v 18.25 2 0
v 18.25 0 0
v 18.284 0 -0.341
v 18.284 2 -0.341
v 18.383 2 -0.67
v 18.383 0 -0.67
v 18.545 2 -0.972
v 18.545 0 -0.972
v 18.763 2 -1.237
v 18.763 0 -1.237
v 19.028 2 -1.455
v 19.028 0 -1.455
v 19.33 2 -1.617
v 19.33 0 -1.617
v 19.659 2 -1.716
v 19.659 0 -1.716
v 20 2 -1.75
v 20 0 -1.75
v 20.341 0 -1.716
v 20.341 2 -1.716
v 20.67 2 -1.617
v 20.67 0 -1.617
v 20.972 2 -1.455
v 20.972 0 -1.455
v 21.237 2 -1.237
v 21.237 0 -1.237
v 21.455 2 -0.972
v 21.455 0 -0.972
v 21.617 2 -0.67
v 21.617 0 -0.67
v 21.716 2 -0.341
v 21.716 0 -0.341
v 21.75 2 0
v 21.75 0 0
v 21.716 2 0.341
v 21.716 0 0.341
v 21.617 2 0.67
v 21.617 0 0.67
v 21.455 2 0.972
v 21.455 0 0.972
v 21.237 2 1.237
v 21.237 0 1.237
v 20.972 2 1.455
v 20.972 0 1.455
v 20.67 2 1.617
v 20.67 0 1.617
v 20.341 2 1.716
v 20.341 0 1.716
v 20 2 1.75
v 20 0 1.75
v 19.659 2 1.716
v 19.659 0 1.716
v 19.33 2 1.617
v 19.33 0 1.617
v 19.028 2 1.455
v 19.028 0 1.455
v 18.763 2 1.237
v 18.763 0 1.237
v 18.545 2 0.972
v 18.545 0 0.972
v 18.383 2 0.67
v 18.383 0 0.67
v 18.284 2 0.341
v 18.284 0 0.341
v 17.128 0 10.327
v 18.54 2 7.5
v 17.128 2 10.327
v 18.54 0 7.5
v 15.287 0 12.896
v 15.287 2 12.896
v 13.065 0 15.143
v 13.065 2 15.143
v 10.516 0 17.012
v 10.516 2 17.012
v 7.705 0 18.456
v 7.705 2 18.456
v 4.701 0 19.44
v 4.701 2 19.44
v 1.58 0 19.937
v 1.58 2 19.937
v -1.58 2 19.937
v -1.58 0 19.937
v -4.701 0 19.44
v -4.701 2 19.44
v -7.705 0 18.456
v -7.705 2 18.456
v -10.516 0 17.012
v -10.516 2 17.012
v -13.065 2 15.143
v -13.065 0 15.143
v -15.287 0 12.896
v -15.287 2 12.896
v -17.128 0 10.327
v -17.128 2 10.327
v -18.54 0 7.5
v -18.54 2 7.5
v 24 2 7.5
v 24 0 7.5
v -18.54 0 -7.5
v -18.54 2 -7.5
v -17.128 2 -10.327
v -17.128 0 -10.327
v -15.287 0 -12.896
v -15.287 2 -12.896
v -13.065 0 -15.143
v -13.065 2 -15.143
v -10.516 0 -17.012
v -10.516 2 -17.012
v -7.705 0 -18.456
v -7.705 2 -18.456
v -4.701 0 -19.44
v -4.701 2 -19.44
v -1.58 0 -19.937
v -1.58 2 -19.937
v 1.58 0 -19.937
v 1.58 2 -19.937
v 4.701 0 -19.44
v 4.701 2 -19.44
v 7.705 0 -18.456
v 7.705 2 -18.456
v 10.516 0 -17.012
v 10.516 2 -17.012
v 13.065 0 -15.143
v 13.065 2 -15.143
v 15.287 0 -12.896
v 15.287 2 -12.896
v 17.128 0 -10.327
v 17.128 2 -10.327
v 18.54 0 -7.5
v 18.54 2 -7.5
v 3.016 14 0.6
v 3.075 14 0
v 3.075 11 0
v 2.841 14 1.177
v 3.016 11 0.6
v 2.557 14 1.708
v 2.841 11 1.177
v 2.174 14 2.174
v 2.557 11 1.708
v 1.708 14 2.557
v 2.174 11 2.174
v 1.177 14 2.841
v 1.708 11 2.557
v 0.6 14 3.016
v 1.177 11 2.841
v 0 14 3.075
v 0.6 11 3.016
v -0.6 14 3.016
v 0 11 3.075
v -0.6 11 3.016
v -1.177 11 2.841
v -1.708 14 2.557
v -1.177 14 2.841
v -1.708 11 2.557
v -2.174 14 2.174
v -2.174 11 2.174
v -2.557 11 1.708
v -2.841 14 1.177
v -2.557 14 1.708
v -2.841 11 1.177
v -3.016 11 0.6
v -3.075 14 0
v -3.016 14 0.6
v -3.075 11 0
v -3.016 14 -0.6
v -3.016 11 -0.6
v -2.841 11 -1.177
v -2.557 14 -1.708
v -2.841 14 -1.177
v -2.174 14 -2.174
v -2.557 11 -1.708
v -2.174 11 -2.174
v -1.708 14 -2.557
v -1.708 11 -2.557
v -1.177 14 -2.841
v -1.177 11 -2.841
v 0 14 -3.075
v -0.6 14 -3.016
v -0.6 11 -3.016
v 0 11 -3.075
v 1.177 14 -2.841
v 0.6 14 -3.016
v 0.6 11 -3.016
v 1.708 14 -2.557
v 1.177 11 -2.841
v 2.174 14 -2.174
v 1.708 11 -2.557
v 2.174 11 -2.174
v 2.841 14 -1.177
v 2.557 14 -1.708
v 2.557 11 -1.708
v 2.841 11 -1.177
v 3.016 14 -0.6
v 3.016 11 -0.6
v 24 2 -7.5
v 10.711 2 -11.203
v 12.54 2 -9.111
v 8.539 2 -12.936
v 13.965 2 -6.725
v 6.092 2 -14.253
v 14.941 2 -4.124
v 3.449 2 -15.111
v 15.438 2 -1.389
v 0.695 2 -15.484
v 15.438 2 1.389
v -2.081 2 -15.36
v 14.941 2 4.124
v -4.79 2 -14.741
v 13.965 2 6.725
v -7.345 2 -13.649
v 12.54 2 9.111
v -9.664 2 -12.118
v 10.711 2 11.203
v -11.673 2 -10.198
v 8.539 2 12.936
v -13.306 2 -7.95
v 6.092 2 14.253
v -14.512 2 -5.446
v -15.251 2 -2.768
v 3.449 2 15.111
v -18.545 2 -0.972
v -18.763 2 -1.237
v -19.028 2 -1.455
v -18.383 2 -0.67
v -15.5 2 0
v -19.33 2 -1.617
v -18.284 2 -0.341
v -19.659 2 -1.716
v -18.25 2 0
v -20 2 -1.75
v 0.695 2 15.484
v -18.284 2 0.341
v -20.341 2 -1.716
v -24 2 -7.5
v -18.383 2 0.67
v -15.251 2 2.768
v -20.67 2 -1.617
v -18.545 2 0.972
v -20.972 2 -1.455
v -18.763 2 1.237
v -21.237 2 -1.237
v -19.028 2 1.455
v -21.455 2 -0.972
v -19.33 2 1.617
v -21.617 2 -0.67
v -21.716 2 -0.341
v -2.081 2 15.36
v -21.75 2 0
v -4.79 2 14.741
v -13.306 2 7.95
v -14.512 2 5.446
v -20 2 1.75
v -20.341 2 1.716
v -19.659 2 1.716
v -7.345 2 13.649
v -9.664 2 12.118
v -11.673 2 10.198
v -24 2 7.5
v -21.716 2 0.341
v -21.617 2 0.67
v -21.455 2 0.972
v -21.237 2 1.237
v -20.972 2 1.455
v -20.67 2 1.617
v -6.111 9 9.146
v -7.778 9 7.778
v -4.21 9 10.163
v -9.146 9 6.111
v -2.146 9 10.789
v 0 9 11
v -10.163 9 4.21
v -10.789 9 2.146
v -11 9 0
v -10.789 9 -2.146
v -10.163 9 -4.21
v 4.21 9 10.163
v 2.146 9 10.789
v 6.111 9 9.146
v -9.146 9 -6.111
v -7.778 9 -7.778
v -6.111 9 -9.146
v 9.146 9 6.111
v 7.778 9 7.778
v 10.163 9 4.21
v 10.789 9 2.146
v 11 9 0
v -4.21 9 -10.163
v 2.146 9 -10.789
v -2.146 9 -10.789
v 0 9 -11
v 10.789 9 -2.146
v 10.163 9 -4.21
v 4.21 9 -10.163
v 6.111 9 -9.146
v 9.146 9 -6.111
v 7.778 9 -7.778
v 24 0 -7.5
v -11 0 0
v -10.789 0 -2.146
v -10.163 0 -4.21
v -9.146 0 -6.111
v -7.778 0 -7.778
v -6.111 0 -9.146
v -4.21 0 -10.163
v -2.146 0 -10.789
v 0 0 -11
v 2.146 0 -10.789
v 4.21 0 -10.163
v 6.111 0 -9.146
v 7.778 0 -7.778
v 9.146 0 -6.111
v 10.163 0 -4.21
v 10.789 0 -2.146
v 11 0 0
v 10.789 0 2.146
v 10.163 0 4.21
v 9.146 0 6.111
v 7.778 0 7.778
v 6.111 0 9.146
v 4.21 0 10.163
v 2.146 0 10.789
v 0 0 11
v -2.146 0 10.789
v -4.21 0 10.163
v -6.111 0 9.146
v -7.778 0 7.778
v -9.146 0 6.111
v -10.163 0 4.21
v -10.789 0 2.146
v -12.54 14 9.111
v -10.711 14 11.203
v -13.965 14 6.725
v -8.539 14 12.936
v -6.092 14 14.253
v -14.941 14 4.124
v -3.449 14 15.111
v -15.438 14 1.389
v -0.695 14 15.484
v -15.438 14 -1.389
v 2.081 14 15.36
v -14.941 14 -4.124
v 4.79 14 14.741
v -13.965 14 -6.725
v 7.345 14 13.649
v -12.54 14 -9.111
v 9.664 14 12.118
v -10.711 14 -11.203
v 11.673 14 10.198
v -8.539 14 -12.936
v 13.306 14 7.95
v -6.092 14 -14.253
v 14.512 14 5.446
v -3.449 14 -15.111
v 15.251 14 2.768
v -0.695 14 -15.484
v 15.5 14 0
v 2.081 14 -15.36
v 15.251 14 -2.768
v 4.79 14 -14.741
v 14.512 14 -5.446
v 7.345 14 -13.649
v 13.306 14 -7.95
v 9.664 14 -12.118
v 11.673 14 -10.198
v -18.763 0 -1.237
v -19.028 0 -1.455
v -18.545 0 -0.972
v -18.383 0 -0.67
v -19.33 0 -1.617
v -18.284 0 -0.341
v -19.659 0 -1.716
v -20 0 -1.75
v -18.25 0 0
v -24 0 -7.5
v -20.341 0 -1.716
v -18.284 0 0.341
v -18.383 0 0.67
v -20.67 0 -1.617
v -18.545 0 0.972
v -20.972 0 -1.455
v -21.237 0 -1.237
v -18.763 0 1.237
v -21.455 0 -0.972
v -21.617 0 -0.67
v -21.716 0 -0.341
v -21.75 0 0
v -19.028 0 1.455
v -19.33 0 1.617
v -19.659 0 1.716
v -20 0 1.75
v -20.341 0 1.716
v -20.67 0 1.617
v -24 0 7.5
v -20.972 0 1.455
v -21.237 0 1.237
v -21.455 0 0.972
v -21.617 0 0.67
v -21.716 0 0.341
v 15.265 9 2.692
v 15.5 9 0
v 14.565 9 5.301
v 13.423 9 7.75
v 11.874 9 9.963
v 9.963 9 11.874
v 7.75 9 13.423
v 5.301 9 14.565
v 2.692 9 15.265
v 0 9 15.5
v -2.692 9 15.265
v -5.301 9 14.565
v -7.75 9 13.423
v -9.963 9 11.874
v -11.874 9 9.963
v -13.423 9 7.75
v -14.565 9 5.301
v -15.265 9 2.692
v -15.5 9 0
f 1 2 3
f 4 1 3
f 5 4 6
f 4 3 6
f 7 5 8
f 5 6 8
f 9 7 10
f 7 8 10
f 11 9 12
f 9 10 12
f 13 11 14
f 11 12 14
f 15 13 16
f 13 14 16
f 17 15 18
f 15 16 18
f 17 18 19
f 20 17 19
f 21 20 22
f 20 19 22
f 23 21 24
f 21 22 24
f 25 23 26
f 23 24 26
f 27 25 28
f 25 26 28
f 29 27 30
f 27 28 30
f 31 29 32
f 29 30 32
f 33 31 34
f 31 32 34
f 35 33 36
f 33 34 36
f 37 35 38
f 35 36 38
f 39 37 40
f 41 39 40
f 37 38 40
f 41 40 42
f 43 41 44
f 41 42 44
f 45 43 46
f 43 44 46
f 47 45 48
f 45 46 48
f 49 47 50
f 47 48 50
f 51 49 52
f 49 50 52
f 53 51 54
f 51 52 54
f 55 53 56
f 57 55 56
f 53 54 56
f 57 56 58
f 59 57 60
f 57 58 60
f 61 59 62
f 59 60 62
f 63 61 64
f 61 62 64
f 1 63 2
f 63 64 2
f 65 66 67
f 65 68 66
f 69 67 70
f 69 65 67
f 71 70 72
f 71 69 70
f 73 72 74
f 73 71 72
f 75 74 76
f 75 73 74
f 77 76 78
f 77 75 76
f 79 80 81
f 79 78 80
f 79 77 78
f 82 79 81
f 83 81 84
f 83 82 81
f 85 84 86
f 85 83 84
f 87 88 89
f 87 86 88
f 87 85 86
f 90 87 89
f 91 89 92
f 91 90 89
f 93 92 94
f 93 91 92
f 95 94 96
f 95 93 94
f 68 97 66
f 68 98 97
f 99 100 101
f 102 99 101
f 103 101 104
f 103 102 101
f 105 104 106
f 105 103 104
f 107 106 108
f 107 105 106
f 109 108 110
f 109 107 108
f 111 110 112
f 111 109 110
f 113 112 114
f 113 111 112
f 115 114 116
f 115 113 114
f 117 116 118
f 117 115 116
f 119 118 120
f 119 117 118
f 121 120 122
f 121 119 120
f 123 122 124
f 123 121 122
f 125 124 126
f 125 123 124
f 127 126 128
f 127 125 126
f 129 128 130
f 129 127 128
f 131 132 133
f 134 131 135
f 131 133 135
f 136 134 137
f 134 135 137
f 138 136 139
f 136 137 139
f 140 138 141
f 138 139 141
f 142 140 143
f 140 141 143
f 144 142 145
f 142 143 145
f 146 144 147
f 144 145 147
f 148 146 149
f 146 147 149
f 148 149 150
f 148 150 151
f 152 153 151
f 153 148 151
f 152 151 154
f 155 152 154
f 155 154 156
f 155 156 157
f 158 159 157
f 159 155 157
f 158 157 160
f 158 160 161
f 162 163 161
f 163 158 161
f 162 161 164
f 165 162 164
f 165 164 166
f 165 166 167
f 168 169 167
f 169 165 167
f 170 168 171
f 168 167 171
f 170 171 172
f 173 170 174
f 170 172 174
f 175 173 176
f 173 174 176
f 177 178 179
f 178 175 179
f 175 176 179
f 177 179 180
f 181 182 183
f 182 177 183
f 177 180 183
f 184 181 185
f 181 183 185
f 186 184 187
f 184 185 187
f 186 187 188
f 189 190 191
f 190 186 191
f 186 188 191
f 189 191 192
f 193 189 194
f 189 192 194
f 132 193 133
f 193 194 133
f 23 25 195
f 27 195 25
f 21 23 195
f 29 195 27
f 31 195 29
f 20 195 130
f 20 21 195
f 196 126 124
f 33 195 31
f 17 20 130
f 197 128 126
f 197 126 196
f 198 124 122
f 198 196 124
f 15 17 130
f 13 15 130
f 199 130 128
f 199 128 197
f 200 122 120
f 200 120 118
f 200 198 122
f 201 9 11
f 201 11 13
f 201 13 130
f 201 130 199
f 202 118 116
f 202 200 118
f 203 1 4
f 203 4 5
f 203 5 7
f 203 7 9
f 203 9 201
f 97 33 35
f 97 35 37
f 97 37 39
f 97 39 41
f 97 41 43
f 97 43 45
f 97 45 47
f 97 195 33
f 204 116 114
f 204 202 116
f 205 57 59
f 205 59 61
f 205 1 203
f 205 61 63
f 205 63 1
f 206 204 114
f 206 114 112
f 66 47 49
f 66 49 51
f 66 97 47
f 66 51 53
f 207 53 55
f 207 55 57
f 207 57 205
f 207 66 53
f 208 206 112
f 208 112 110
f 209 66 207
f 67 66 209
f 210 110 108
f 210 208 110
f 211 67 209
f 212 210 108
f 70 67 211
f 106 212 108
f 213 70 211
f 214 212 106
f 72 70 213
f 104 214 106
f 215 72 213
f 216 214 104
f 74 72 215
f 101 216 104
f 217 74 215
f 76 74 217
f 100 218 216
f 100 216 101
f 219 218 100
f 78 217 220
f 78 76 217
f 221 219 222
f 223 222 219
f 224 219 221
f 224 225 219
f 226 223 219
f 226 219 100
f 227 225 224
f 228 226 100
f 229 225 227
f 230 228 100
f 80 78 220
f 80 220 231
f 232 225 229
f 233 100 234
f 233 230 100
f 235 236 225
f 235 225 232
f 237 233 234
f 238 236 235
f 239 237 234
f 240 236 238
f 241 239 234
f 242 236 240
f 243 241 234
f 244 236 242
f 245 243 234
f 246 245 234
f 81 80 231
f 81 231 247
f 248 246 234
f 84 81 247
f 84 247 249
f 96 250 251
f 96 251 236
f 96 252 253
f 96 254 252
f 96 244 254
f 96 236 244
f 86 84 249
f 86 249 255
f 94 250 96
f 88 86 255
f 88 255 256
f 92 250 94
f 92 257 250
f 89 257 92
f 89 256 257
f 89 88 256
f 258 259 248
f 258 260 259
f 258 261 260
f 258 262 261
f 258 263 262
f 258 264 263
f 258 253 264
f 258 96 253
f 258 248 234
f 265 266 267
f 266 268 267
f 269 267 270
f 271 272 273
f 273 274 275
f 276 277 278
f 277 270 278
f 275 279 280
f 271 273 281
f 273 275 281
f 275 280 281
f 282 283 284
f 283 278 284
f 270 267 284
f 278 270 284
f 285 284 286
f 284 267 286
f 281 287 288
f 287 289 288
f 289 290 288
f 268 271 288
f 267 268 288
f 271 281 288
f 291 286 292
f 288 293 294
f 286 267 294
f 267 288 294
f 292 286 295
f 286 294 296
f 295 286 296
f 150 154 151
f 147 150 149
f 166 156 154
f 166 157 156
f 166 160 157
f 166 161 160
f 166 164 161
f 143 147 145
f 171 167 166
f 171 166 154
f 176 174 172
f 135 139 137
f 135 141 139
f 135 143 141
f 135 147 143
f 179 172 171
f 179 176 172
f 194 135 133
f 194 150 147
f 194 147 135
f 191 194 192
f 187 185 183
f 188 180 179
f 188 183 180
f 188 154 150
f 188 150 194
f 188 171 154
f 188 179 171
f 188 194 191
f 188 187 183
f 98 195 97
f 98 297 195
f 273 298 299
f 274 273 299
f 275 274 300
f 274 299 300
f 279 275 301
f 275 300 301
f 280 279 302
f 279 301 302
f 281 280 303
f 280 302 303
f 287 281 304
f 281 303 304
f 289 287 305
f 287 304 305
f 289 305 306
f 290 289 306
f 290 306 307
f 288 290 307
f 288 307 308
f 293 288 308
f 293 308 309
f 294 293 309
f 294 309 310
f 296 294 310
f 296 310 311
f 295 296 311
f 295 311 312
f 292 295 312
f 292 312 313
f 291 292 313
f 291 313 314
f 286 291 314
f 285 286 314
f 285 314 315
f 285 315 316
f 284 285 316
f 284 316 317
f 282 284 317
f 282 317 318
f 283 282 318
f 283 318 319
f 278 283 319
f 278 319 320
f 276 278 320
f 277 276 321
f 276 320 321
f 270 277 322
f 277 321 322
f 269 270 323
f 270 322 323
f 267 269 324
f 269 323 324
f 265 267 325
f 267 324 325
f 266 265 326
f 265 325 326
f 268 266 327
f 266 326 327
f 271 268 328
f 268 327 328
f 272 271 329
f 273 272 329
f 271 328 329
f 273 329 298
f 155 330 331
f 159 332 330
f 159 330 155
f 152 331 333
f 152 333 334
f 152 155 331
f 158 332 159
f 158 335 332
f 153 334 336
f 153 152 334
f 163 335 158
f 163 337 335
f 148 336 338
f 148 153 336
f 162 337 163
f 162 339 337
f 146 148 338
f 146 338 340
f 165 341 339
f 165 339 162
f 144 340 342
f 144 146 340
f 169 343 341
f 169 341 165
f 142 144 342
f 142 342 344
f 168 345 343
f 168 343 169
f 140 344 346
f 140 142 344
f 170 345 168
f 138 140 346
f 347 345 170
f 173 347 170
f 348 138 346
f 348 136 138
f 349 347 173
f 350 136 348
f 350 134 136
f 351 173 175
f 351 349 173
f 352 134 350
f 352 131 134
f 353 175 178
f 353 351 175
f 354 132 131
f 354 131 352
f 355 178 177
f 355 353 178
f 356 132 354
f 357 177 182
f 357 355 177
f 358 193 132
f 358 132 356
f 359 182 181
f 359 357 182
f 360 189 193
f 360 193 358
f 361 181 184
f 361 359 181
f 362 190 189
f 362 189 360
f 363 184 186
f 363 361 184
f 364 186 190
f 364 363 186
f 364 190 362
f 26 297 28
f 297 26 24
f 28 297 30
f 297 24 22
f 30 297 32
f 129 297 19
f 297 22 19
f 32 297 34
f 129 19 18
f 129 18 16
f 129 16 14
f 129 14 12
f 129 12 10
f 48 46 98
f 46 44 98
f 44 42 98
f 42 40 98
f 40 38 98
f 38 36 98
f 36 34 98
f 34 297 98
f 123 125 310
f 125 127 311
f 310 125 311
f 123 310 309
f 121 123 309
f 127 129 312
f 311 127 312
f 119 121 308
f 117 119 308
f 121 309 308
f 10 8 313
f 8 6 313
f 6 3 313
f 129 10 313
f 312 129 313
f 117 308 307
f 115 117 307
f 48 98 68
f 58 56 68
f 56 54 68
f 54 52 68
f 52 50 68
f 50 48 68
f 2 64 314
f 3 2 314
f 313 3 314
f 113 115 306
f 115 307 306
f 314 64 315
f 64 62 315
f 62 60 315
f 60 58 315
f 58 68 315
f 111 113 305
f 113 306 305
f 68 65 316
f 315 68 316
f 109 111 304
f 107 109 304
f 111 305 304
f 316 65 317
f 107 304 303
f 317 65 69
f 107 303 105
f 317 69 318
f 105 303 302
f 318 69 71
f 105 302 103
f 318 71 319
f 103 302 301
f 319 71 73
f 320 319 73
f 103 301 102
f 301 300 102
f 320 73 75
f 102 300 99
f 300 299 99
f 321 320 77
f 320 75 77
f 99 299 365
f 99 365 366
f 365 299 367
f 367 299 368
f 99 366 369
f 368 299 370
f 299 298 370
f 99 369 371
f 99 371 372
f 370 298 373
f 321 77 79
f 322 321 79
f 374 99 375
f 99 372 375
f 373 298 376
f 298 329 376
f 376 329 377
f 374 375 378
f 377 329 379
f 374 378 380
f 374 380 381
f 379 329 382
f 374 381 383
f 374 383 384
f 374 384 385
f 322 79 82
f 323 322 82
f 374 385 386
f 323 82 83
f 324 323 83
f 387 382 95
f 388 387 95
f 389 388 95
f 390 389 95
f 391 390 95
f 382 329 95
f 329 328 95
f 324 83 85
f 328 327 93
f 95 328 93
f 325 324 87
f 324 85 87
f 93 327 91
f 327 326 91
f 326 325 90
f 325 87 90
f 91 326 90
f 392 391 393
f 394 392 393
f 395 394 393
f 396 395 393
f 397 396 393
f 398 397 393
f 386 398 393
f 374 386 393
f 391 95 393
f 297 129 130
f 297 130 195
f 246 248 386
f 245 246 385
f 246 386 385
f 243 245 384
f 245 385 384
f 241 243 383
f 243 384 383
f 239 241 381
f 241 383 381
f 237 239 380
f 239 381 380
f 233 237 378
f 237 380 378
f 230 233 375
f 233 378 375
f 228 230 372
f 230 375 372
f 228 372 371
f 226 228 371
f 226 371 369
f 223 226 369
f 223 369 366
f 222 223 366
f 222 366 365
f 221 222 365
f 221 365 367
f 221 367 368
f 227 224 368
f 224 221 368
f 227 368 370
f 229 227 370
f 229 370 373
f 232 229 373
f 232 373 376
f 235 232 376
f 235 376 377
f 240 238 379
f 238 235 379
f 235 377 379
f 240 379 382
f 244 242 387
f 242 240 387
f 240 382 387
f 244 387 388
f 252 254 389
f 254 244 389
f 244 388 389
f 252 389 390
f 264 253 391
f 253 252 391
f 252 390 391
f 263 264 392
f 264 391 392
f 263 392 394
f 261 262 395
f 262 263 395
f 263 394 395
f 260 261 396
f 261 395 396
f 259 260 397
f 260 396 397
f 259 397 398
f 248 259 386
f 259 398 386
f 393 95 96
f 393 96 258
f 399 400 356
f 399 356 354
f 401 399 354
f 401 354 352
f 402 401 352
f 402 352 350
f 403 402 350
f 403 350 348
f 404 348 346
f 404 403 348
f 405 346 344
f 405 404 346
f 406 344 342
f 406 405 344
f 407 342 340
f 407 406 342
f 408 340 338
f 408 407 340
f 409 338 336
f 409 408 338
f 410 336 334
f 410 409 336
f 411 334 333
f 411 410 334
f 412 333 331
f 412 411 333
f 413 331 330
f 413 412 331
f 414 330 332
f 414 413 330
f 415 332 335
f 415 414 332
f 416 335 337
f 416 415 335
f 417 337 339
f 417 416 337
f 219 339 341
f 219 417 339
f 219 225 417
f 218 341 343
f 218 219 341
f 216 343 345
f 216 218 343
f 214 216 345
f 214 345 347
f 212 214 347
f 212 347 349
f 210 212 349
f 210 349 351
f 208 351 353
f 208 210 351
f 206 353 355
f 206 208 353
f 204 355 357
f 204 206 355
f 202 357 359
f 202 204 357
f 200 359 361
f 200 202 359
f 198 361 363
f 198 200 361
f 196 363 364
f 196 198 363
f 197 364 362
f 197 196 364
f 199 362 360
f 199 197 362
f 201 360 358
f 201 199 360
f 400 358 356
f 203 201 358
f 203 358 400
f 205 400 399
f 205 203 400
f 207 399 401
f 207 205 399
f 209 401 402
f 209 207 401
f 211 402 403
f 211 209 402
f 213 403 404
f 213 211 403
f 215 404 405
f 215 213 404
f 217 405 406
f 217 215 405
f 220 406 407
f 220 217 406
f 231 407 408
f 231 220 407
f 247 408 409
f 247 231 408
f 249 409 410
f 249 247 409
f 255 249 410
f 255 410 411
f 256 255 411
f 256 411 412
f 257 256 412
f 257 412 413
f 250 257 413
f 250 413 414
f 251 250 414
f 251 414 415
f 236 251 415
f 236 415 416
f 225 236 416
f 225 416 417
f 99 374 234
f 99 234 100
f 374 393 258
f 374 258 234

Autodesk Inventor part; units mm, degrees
ref_plane "YZ Plane" through (0, 0, 0) normal (1, 0, 0) x (0, 1, 0)
ref_plane "XZ Plane" through (0, 0, 0) normal (0, 1, 0) x (-1, 0, 0)
ref_plane "XY Plane" through (0, 0, 0) normal (0, 0, 1) x (1, 0, 0)
sketch "Sketch1" plane through (0, 0, 0) normal (0, 1, 0) x (-1, 0, 0)
  circle A0 centre (0, 0) radius 1.5
  circle A1 centre (0, 0) radius 20
  line L0 (24, -7.5) -> (-24, -7.5)
  line L1 (-24, -7.5) -> (-24, 7.5)
  line L2 (-24, 7.5) -> (24, 7.5)
  line L3 (24, 7.5) -> (24, -7.5)
  line L4 (24, -7.5) -> (-24, 7.5) construction
  line L5 (-24, -7.5) -> (24, 7.5) construction
  circle A2 centre (0, 0) radius 11
  circle A3 centre (20, 0) radius 1.75
  circle A4 centre (-20, 0) radius 1.75
  circle A5 centre (0, 0) radius 15.5
  point P0 (-18.5405, -7.5)
  point P1 (18.5405, -7.5)
  point P2 (18.5405, 7.5)
  point P3 (-18.5405, 7.5)
  dimension "d0" = 40
  dimension "d1" = 48
  dimension "d2" = 15
  dimension "d3" = 22
  dimension "d4" = 3.5
  dimension "d5" = 3.5
  dimension "d6" = 31
extrude "Extrusion1" add sketch "Sketch1" along normal blind 2 contours A3 A1 L0 A5 L2 | A1 L2 L3 L0 A3 | L2 A5 A1 | A1 L0 A5 | L2 A5 L0 A1 A4 | A1 A4 L0 L1 L2
extrude "Extrusion2" add sketch "Sketch1" along normal blind 9 contours A5 L0 A2 L2 | L2 A2 A5 | A5 L0 A2 | L2 A2 L0 A5
sketch "Sketch2" plane through (0, 9, 0) normal (0, 1, 0) x (1, 0, 0)
  circle A0 centre (0, 0) radius 15.5
  circle A1 centre (0, 0) radius 8.3846
  circle A2 centre (0, 0) radius 3.075
  dimension "d11" = 31
  dimension "d12" = 6.15
extrude "Extrusion3" add sketch "Sketch2" along normal blind 5 contours A0 | A1
extrude "Extrusion4" add sketch "Sketch2" along normal blind 2 contours A1 | A2
properties part number "magnetholder"
